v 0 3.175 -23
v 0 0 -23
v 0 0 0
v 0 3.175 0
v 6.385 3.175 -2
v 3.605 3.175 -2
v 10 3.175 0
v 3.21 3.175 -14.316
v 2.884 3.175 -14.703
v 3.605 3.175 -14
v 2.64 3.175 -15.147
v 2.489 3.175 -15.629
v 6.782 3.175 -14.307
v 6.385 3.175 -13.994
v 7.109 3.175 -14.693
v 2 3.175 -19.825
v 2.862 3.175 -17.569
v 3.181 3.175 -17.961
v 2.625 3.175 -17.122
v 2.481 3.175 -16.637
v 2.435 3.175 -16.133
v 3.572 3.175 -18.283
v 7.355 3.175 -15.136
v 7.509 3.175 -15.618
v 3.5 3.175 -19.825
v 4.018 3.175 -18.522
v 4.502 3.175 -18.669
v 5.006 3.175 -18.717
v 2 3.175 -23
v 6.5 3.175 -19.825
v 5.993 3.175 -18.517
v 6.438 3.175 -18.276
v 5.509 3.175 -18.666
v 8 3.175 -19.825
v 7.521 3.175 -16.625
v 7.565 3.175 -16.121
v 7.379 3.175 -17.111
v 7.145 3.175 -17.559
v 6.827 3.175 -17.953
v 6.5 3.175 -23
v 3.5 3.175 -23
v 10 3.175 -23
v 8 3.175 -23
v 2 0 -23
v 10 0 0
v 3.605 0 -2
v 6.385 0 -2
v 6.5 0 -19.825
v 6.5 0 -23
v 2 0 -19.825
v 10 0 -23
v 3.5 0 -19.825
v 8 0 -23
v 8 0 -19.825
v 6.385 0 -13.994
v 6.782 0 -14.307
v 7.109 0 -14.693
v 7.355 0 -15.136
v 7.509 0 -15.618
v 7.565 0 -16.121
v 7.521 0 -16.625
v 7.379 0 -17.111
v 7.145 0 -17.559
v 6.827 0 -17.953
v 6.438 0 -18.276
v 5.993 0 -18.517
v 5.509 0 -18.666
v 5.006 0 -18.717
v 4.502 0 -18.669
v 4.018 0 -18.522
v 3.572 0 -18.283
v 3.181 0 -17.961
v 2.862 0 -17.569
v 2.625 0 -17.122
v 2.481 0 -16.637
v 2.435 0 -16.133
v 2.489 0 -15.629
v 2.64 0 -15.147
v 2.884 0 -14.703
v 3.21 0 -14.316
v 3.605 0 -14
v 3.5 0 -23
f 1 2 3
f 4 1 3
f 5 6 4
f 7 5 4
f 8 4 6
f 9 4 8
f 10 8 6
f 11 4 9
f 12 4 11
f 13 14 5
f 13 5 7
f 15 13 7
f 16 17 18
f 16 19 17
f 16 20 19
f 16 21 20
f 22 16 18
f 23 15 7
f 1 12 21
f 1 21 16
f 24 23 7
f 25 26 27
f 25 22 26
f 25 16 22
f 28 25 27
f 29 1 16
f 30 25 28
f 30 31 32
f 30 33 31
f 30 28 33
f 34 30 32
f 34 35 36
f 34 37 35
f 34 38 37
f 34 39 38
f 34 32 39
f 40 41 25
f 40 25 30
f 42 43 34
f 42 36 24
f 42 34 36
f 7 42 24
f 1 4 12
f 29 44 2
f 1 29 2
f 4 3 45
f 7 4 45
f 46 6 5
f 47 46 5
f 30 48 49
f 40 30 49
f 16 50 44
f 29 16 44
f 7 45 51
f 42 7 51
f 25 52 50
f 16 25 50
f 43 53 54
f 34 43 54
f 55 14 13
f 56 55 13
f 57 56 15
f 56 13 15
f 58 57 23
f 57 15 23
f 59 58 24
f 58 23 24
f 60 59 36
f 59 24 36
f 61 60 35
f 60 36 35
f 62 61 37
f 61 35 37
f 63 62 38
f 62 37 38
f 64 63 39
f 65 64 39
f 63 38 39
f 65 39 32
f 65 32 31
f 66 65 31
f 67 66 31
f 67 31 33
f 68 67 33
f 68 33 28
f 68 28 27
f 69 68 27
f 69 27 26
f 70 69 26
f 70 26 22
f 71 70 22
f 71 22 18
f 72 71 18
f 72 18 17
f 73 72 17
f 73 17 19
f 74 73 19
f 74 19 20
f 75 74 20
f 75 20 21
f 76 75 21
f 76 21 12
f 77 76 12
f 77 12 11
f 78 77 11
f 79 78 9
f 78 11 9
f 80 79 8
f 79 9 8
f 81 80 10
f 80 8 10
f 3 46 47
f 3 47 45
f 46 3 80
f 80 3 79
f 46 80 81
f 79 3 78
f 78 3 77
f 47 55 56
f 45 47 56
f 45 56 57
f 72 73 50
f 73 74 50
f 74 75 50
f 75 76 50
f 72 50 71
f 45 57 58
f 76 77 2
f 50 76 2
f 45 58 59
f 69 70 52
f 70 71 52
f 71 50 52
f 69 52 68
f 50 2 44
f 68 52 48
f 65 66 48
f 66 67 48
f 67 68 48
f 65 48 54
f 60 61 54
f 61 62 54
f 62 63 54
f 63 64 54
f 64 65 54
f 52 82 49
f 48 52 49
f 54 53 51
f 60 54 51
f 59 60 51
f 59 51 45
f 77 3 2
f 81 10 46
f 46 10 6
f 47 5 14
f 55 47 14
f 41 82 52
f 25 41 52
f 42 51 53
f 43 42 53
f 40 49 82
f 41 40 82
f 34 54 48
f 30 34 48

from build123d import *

# Parameters (mm, degrees)
BOSS_EXTRUDE1_DEPTH = 3.175
CUT_EXTRUDE1_REACH  = 5.175


with BuildPart() as part:
    # Sketch1 → Boss-Extrude1 (new body)
    with BuildSketch(Plane(origin=(0, 0, 0), x_dir=(1, 0, 0), z_dir=(0, 1, 0))):
        Polygon((0, 0), (10, 0), (10, 23), (8, 23), (8, 19.825), (6.5, 19.825), (6.5, 23), (3.5, 23), (3.5, 19.825), (2, 19.825), (2, 23), (0, 23), align=None)
    extrude(amount=BOSS_EXTRUDE1_DEPTH)

    # Sketch3 → Cut-Extrude1 (cut, up to next)
    with BuildSketch(Plane(origin=(0, 3.175, 0), x_dir=(1, 0, 0), z_dir=(0, 1, 0)), mode=Mode.PRIVATE) as cut_extrude1_sk1:
        with BuildLine():
            Line((3.605, 2), (6.385, 2))
            Line((6.385, 2), (6.385, 13.993552011))
            ThreePointArc((6.385, 13.993552011), (5.005949297, 18.717480034), (3.605, 14))
            Line((3.605, 14), (3.605, 2))
        make_face()
    cut_extrude1_tool1 = extrude(cut_extrude1_sk1.sketch, amount=-CUT_EXTRUDE1_REACH, mode=Mode.PRIVATE) & part.part
    add(cut_extrude1_tool1.solids().sort_by_distance((4.996868, 3.175, -11.078992))[0], mode=Mode.SUBTRACT)


solid = part.part
